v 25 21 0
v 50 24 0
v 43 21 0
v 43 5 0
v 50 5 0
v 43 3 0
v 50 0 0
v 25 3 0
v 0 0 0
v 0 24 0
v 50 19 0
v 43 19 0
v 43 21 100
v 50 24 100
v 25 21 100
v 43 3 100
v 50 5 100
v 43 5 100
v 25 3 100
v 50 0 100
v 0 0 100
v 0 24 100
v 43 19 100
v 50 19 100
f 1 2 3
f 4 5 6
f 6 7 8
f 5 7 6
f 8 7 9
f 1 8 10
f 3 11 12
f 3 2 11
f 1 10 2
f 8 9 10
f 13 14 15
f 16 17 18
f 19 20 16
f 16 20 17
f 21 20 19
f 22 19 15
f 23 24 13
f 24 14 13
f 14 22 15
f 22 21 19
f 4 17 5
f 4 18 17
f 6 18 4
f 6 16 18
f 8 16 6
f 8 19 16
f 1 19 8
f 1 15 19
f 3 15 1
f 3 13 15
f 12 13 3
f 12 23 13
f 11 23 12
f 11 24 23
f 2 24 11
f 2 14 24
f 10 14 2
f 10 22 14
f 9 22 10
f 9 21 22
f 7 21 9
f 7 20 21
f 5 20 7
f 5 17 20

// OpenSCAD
$fn = 32;

// ----------------------------------------------------------------------
// T-slot rail: 50 x 24 mm section, 100 mm long
// ----------------------------------------------------------------------

// --- parameters (mm) ---
profile_height = 100;     // extrusion height
profile_points = 12;      // points of the closed outline

profile = [[0, 0], [50, 0], [50, 5], [43, 5], [43, 3], [25, 3], [25, 21], [43, 21], [43, 19], [50, 19], [50, 24], [0, 24]];  // single closed polygon, 12 points, counter clockwise

// --- the one profile operation ---
linear_extrude(height = profile_height) polygon(points = profile);
